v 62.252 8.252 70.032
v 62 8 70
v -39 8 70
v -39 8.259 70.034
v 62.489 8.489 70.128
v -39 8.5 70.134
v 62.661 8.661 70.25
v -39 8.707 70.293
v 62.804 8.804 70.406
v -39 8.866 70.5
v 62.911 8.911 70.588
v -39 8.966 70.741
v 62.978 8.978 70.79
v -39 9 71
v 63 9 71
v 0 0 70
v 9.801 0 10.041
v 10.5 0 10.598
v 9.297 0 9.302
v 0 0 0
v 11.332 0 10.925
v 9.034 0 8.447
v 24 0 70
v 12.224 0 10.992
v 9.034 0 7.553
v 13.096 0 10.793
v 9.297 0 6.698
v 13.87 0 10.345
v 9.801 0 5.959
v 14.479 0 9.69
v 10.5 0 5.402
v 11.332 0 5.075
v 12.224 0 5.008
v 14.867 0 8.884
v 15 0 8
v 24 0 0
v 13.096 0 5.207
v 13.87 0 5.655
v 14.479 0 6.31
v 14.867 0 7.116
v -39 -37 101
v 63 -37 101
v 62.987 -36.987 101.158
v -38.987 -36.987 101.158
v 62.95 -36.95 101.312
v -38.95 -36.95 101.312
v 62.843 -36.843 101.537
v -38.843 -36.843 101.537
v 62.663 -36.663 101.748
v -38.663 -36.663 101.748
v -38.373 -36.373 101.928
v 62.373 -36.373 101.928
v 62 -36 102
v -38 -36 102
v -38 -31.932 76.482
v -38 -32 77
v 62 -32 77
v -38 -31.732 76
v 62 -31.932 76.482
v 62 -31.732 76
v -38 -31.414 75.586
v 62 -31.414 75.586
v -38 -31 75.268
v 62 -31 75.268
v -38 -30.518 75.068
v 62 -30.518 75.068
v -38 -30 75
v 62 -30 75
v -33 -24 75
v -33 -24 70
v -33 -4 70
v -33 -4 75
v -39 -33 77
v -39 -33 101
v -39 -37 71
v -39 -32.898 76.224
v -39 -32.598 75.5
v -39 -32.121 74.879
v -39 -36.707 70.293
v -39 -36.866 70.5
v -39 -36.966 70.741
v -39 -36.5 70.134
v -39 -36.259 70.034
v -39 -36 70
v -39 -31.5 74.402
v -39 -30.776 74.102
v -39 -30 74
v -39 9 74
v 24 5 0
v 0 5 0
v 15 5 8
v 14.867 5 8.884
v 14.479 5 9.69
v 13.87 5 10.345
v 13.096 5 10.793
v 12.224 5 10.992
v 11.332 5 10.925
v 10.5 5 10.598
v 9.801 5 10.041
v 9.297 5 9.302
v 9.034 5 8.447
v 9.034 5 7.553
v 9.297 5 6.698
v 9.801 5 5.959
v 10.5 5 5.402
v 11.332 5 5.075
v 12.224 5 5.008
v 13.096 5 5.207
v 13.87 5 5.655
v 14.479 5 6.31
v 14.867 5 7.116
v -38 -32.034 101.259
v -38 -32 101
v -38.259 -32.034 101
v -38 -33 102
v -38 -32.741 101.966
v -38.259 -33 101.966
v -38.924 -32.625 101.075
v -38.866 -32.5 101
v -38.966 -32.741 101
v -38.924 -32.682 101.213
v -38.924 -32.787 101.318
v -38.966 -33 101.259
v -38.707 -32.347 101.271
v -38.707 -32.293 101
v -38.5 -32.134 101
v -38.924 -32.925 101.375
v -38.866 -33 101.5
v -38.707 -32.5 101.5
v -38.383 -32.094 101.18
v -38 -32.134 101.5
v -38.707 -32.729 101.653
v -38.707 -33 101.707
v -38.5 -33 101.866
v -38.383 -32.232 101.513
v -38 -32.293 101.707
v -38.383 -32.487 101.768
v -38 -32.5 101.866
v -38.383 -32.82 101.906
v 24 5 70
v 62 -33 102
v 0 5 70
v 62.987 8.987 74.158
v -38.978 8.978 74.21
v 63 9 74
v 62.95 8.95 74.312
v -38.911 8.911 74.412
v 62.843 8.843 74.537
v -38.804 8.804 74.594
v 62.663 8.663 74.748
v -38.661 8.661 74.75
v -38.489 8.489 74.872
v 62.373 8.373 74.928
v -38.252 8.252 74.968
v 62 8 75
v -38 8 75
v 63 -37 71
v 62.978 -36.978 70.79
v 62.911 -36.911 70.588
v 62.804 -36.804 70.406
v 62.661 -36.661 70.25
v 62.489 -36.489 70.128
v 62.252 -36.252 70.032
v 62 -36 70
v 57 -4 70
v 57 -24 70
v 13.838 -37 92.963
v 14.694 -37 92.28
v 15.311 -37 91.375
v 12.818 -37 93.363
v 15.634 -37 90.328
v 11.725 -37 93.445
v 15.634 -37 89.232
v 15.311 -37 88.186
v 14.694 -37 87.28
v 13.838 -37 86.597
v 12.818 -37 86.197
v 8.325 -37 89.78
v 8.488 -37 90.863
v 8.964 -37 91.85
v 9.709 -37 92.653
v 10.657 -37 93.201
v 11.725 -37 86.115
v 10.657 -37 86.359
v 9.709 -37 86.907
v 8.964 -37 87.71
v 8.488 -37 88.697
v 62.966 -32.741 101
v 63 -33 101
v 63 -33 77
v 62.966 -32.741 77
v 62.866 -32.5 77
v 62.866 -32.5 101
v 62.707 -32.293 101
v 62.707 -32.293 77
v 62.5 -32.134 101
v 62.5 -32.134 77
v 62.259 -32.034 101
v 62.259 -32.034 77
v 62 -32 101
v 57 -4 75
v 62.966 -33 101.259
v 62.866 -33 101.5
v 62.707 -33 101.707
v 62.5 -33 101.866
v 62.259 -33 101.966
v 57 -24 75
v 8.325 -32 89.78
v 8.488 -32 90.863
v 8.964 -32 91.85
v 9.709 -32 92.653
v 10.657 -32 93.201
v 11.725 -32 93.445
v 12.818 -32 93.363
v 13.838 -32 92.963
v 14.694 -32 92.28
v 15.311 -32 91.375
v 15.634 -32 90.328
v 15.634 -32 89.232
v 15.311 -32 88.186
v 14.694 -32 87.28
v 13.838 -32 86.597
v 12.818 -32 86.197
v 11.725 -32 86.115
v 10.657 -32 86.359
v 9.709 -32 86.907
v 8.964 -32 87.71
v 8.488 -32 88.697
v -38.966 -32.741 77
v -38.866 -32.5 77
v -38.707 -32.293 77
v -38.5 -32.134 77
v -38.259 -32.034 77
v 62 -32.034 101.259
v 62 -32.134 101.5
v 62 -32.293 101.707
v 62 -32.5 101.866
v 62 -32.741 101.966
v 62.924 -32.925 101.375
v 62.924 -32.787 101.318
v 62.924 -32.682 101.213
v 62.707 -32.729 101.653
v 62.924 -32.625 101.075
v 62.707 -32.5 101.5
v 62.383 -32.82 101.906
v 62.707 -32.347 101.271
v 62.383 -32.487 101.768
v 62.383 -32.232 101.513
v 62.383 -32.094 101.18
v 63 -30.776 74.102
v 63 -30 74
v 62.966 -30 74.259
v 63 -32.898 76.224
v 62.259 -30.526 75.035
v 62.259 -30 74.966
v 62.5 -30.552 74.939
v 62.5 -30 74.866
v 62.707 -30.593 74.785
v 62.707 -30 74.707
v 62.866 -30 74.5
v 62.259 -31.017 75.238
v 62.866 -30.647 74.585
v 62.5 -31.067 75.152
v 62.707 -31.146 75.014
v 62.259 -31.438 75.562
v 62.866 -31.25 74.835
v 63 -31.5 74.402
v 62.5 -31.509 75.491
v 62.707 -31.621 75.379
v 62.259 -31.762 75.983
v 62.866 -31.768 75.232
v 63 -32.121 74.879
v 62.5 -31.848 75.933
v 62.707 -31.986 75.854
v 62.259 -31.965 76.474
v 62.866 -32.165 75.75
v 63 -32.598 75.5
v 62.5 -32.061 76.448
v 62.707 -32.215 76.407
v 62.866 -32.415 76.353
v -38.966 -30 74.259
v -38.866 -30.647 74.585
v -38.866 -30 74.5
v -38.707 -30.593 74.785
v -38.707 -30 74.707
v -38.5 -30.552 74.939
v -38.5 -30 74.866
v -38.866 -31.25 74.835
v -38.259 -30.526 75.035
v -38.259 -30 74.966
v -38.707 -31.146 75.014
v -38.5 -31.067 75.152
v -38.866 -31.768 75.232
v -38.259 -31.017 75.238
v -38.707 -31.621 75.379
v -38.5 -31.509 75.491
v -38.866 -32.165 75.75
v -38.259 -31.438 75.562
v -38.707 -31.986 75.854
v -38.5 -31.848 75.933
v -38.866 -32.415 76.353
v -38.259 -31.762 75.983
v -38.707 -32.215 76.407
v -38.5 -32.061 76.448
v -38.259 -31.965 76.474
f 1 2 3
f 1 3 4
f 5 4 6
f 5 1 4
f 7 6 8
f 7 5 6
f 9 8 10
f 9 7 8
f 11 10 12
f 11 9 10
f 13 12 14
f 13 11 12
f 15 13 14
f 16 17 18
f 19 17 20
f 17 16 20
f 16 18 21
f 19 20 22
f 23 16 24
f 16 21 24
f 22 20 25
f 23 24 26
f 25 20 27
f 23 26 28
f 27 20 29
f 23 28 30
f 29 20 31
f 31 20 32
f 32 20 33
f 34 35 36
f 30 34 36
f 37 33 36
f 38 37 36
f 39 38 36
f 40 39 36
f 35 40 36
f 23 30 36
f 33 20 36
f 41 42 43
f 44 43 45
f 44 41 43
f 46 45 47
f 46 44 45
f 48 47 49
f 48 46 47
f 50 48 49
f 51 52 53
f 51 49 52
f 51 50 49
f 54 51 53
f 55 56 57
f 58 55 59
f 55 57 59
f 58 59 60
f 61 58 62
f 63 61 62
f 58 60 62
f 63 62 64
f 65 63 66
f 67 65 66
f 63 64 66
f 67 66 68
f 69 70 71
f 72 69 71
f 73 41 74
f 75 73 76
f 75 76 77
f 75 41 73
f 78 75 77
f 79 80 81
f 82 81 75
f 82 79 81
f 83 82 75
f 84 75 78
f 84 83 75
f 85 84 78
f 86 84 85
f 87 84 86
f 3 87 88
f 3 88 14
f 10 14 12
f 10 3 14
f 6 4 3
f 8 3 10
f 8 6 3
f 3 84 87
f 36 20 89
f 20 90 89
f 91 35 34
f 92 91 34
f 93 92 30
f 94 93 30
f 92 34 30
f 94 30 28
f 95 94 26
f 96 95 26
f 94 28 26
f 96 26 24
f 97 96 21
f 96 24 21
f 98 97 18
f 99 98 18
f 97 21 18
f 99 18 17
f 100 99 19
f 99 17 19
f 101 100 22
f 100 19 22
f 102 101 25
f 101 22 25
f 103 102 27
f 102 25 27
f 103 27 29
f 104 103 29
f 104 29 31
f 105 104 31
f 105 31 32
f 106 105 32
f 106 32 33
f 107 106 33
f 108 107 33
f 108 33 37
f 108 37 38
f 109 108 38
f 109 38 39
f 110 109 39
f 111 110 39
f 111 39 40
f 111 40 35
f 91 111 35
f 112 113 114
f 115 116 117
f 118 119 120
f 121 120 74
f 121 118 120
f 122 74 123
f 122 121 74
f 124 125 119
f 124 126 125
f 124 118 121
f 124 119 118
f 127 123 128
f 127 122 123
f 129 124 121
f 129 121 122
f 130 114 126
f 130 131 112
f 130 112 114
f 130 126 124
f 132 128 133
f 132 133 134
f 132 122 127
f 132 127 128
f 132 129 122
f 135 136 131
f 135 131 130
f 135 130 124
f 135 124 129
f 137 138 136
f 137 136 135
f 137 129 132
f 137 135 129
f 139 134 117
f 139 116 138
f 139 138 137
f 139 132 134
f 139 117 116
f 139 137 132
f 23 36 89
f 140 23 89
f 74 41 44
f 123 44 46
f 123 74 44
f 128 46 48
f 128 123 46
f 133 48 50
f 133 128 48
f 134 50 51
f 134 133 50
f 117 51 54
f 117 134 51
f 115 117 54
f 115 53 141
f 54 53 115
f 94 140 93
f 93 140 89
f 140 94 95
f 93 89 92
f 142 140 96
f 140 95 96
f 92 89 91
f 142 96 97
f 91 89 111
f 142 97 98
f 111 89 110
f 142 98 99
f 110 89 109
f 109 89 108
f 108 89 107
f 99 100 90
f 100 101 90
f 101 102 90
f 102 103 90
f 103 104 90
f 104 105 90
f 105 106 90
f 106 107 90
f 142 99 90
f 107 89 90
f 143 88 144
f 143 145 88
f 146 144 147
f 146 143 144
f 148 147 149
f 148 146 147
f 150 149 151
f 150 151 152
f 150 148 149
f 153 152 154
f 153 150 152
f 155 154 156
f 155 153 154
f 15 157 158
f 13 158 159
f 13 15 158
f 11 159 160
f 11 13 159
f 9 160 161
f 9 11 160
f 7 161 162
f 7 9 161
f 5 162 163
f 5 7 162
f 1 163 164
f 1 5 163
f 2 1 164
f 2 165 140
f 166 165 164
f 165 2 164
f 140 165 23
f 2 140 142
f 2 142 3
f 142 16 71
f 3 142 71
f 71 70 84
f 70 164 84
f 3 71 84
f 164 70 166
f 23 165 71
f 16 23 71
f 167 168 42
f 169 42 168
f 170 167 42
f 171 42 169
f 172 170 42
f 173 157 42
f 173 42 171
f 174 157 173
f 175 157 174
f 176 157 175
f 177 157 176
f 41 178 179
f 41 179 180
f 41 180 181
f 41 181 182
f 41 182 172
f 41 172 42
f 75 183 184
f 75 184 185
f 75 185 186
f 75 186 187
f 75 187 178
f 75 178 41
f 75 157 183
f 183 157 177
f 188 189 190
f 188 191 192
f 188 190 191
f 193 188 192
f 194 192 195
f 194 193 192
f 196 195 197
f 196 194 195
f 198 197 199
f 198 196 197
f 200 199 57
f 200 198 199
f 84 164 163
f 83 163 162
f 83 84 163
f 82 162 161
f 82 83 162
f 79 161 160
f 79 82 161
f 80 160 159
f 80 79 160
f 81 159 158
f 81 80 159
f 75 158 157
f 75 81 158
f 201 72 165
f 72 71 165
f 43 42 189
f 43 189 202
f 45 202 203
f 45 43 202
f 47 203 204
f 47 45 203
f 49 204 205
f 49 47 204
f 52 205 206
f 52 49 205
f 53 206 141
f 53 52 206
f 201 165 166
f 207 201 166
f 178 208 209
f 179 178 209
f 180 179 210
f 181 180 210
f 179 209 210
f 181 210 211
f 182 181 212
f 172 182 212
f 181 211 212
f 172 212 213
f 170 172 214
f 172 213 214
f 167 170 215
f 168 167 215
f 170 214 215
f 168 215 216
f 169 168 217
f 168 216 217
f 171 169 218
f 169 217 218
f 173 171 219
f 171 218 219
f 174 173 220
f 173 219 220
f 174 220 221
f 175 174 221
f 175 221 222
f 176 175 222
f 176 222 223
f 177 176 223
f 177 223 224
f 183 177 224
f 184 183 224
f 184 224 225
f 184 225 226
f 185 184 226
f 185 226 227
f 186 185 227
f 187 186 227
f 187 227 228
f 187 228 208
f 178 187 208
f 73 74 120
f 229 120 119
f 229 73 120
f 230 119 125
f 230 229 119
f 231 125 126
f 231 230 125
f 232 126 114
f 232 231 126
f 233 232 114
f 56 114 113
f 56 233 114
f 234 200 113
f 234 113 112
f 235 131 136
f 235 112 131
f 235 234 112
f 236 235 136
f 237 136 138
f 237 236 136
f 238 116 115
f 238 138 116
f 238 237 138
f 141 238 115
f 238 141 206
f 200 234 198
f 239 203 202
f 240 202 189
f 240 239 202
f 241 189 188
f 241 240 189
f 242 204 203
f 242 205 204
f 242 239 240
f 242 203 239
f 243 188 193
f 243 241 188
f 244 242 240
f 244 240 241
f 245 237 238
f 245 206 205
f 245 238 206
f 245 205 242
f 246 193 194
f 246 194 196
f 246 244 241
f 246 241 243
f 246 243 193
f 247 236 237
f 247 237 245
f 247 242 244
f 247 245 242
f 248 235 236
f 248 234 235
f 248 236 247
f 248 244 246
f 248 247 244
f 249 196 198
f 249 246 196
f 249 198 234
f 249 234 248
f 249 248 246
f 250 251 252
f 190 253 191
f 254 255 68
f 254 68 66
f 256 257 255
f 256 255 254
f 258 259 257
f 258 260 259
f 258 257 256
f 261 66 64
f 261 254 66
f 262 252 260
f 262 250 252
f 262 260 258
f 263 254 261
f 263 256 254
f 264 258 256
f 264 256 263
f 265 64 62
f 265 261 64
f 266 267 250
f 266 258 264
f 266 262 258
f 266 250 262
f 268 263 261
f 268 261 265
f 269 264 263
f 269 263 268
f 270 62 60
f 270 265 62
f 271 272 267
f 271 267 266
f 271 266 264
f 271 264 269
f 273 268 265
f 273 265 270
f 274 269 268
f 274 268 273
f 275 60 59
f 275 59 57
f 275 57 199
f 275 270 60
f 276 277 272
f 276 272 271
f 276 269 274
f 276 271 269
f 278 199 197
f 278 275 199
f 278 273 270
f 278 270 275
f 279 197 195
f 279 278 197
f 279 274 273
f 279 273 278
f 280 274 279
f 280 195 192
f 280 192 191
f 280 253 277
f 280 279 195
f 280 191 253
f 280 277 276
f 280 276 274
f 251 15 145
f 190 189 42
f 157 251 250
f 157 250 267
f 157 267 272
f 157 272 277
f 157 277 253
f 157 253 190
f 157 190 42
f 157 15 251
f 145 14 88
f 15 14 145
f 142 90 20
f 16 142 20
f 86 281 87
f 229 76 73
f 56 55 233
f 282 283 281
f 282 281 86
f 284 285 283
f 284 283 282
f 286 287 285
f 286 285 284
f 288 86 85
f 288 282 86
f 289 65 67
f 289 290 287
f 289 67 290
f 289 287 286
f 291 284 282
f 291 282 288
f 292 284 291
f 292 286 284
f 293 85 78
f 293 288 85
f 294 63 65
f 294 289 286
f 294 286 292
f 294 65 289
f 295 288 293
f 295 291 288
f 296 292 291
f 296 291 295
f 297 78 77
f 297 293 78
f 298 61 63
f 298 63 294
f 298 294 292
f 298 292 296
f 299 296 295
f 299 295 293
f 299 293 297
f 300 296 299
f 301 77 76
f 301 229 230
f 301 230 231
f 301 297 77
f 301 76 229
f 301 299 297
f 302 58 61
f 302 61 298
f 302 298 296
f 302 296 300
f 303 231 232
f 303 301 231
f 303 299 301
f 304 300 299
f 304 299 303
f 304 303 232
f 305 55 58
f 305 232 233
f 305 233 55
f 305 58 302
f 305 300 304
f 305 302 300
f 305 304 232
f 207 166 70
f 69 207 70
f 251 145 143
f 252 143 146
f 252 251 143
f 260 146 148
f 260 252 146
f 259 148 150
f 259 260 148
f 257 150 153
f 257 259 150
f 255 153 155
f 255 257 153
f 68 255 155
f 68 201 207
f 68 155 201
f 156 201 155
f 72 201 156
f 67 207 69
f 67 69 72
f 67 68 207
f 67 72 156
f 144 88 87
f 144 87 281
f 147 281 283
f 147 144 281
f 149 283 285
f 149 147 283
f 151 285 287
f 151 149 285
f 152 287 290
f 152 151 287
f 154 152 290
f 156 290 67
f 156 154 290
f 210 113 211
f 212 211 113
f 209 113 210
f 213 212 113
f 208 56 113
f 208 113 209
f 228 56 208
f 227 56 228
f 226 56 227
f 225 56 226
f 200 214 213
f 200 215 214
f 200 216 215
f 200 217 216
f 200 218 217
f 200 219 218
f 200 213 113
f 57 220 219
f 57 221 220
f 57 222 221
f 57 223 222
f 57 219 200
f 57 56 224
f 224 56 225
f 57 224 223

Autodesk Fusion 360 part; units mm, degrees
sketch "Sketch1" plane through (0, 0, 0) normal (0, 0, 1) x (1, 0, 0)
sketch "Sketch2" plane through (0, 0, 0) normal (0, 0, 1) x (1, 0, 0)
  line L0 (0, 0) -> (24, 0)
  line L1 (24, 0) -> (24, 5)
  line L2 (24, 5) -> (0, 5)
  line L3 (0, 5) -> (0, 0)
  dimension "d157" = 24
  dimension "d158" = 5
extrude "Extrude1" add sketch "Sketch2" along normal blind 70
sketch "Sketch3" plane through (0, 0, 0) normal (0, -1, 0) x (1, 0, 0)
  circle A0 centre (12, 8) radius 3
  line L0 (0, 0) -> (24, 0)
  line L1 (0, 0) -> (0, 70)
  dimension "d161" = 6
  dimension "d162" = 8
  dimension "d163" = 12
extrude "Extrude2" cut sketch "Sketch3" against normal blind 5
sketch "Sketch4" plane through (0, 0, 0) normal (0, -1, 0) x (1, 0, 0)
sketch "Sketch5" plane through (0, 0, 0) normal (0, -1, 0) x (1, 0, 0)
  circle A0 centre (12, 8) radius 3
  dimension "d166" = 6
sketch "Sketch6" plane through (0, 0, 70) normal (0, 0, 1) x (-1, 0, 0)
  line L0 (39, -9) -> (-63, -9)
  line L1 (-63, -9) -> (-63, 37)
  line L2 (-63, 37) -> (39, 37)
  line L3 (39, 37) -> (39, -9)
  line L4 (-24, 0) -> (-24, -5)
  line L5 (-24, -5) -> (0, -5)
  line L6 (33, 4) -> (-57, 4)
  line L7 (-57, 4) -> (-57, 24)
  line L8 (-57, 24) -> (33, 24)
  line L9 (33, 24) -> (33, 4)
  line L10 (0, 0) -> (-24, 0)
  line L11 (39, 32) -> (-63, 32)
  dimension "d167" = 102
  dimension "d168" = 46
  dimension "d169" = 39
  dimension "d170" = 4
  dimension "d171" = 90
  dimension "d172" = 20
  dimension "d173" = 4
  dimension "d174" = 6
  dimension "d175" = 5
extrude "Extrude3" add sketch "Sketch6" along normal blind 5 contours L0 L1 L3 L11
extrude "Extrude4" add sketch "Sketch6" along normal blind 32 contours L1 L2 L3 L11
fillet "Fillet1" radius 2 1 edges at (12, -32, 75)
fillet "Fillet2" radius 1 14 edges at (12, -37, 102) (12, -32, 102) (63, -34.5, 102) (-39, -34.5, 102) (-39, -10.5, 75) (-39, -31.4142, 75.5858) (-39, -32, 89.5) (12, -37, 70) (63, -14, 70) (12, 9, 70) (12, 9, 75) (63, -32, 89.5) (63, -31.4142, 75.5858) (63, -10.5, 75)
sketch "Sketch7" plane through (0, -32, 0) normal (0, 1, 0) x (-1, 0, 0)
  circle A0 centre (-12, 89.7801) radius 3.675
  line L0 (39, 77) -> (39, 101)
  dimension "d184" = 7.35
  dimension "d185" = 51
extrude "Extrude5" cut sketch "Sketch7" against normal blind 5
equation "d163 = d157 / 2"
